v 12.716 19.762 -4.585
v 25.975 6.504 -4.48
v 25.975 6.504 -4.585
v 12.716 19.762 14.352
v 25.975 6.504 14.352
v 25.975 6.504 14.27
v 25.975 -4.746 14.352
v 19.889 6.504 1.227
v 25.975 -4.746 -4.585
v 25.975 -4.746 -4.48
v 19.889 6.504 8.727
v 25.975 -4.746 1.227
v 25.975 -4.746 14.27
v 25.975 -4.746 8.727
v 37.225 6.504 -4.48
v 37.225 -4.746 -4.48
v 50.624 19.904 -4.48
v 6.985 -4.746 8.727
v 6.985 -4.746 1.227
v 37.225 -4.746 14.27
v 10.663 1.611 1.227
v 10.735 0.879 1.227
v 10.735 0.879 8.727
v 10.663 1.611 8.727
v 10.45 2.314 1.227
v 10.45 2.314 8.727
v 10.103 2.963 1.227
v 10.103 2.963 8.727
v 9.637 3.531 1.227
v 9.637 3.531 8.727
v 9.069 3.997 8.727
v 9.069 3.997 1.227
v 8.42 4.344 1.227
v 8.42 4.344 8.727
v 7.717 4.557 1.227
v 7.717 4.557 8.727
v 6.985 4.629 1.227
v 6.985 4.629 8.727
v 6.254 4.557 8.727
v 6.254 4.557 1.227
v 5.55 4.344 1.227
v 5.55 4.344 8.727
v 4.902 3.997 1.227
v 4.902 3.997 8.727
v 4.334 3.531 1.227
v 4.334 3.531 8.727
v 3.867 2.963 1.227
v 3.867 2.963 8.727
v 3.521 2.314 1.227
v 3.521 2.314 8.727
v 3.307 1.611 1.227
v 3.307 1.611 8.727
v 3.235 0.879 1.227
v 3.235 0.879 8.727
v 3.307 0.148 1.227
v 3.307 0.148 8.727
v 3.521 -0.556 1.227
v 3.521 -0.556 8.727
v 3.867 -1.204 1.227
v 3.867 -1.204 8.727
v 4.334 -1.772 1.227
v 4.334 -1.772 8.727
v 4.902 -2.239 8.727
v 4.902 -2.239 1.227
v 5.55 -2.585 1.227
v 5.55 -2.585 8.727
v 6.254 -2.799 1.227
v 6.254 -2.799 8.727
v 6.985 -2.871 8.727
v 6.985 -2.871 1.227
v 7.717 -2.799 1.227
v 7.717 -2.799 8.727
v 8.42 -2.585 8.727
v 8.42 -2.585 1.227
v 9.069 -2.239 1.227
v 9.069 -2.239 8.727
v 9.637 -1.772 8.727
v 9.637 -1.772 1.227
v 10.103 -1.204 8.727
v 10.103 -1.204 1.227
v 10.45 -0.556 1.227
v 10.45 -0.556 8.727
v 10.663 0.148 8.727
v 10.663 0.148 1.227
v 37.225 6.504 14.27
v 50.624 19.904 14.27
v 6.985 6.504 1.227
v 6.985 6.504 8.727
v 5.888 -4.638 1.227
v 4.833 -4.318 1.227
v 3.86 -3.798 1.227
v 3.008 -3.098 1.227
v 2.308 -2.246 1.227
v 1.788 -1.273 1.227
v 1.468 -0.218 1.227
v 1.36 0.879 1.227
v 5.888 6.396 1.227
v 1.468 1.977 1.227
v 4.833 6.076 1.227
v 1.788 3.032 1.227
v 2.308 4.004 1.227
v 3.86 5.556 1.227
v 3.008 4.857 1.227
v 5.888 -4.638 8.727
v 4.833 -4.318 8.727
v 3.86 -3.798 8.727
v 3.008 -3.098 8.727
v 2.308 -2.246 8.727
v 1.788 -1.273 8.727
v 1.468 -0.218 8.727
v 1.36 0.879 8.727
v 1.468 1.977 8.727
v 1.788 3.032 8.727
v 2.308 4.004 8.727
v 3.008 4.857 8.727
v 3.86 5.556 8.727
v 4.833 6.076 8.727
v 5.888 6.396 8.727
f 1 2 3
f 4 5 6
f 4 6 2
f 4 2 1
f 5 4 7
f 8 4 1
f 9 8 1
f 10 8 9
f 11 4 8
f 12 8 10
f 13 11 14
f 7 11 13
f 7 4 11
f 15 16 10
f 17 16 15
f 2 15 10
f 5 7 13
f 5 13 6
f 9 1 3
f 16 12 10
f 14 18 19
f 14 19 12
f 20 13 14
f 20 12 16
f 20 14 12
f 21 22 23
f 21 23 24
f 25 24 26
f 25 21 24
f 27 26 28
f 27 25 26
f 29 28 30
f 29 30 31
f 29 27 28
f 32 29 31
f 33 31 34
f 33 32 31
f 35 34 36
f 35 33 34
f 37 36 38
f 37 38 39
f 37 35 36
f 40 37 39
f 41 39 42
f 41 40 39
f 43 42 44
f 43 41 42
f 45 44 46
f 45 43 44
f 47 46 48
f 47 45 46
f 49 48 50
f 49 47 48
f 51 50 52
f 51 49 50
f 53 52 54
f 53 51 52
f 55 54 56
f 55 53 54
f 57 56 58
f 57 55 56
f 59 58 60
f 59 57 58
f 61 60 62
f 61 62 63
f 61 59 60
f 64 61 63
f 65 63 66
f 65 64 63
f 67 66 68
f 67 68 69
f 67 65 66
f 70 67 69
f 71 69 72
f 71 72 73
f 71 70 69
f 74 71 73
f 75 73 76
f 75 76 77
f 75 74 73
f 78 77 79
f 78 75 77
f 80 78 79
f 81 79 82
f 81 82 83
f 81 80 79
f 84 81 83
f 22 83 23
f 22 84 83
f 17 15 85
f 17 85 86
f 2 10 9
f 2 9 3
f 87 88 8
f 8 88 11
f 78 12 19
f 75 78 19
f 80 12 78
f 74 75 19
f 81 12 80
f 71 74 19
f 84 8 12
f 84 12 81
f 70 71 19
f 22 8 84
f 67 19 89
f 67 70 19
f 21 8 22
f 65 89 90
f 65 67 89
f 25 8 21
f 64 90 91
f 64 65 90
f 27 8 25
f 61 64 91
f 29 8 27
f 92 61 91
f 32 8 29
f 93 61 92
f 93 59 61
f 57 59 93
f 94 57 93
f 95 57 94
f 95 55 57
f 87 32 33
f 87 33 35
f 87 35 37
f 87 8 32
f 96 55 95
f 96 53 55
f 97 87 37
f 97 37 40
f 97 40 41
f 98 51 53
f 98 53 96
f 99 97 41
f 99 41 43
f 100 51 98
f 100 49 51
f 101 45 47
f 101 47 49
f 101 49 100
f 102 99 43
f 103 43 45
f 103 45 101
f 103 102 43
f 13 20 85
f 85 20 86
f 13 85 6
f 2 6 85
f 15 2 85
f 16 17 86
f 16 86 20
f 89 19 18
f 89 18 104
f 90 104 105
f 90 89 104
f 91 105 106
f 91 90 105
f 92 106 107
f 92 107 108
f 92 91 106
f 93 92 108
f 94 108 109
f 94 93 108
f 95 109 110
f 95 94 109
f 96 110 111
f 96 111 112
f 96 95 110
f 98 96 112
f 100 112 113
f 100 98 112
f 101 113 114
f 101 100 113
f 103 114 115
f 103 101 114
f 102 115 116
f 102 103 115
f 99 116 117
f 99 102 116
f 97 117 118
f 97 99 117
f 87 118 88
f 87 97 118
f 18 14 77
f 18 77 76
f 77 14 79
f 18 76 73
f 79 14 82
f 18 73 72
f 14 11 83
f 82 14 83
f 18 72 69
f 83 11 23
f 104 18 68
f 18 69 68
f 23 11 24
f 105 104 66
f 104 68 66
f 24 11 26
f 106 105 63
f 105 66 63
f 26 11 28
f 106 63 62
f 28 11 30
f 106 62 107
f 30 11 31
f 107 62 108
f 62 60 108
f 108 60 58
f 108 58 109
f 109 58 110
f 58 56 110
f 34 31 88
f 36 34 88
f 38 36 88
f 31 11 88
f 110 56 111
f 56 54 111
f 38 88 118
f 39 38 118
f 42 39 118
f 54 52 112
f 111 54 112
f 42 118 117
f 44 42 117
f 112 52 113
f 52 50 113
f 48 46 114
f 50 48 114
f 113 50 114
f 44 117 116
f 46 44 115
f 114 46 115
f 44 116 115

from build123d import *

# Parameters (mm, degrees)
CROQUIS1_R                    = 5
SALIENTE_EXTRUIR1_DEPTH       = 10
CROQUIS4_W                    = 15
CROQUIS4_H                    = 25
SALIENTE_EXTRUIR3_DEPTH       = 15
SALIENTE_EXTRUIR9_DEPTH       = 25
SALIENTE_EXTRUIR10_DEPTH      = 7.75
SALIENTE_EXTRUIR10_DEPTH_BACK = 17.5
ESCALA1_SCALE                 = 0.75


with BuildPart() as part:
    # Croquis1 → Saliente-Extruir1 (new body)
    with BuildSketch(Plane.XY):
        with BuildLine():
            Line((0, 7.5), (30, 7.5))
            Line((30, 7.5), (37.5, 7.5))
            Line((37.5, 7.5), (37.5, -7.5))
            Line((37.5, -7.5), (30, -7.5))
            Line((30, -7.5), (0, -7.5))
            ThreePointArc((0, -7.5), (-7.5, 0), (0, 7.5))
        make_face()
        Circle(CROQUIS1_R, mode=Mode.SUBTRACT)
    extrude(amount=SALIENTE_EXTRUIR1_DEPTH)

    # Croquis4 → Saliente-Extruir3 (add)
    with BuildSketch(Plane.XZ.offset(7.5)):
        with Locations((32.819126762, 4.89)):
            Rectangle(CROQUIS4_W, CROQUIS4_H)
    extrude(amount=-SALIENTE_EXTRUIR3_DEPTH)

    # Croquis11 → Saliente-Extruir9 (add)
    with BuildSketch(Plane(origin=(0, 0, -7.61), x_dir=(-1, 0, 0), z_dir=(0, 0, -1))):
        Polygon((-40.319126762, 7.5), (-58.184981349, 25.365854587), (-40.319126762, -7.5), align=None)
    extrude(amount=-SALIENTE_EXTRUIR9_DEPTH)

    # Croquis14 → Saliente-Extruir10 (add, two sides: drawn at the far end of the back side and taken through both)
    with BuildSketch(Plane(origin=(0, 0, 0), x_dir=(-1, 0, 0), z_dir=(0, 0, -1)).offset(-SALIENTE_EXTRUIR10_DEPTH_BACK)):
        Polygon((-25.319126762, 7.5), (-7.641457232, 25.17766953), (-25.319126762, -7.5), align=None)
    extrude(amount=SALIENTE_EXTRUIR10_DEPTH + SALIENTE_EXTRUIR10_DEPTH_BACK)


with BuildPart() as part_1:
    # Escala1: scaled about (27.940941058, 3.516863711, 4.909948999)
    add(part.part.scale(ESCALA1_SCALE).moved(Location((6.985235264, 0.879215928, 1.22748725))))


solid = part_1.part
